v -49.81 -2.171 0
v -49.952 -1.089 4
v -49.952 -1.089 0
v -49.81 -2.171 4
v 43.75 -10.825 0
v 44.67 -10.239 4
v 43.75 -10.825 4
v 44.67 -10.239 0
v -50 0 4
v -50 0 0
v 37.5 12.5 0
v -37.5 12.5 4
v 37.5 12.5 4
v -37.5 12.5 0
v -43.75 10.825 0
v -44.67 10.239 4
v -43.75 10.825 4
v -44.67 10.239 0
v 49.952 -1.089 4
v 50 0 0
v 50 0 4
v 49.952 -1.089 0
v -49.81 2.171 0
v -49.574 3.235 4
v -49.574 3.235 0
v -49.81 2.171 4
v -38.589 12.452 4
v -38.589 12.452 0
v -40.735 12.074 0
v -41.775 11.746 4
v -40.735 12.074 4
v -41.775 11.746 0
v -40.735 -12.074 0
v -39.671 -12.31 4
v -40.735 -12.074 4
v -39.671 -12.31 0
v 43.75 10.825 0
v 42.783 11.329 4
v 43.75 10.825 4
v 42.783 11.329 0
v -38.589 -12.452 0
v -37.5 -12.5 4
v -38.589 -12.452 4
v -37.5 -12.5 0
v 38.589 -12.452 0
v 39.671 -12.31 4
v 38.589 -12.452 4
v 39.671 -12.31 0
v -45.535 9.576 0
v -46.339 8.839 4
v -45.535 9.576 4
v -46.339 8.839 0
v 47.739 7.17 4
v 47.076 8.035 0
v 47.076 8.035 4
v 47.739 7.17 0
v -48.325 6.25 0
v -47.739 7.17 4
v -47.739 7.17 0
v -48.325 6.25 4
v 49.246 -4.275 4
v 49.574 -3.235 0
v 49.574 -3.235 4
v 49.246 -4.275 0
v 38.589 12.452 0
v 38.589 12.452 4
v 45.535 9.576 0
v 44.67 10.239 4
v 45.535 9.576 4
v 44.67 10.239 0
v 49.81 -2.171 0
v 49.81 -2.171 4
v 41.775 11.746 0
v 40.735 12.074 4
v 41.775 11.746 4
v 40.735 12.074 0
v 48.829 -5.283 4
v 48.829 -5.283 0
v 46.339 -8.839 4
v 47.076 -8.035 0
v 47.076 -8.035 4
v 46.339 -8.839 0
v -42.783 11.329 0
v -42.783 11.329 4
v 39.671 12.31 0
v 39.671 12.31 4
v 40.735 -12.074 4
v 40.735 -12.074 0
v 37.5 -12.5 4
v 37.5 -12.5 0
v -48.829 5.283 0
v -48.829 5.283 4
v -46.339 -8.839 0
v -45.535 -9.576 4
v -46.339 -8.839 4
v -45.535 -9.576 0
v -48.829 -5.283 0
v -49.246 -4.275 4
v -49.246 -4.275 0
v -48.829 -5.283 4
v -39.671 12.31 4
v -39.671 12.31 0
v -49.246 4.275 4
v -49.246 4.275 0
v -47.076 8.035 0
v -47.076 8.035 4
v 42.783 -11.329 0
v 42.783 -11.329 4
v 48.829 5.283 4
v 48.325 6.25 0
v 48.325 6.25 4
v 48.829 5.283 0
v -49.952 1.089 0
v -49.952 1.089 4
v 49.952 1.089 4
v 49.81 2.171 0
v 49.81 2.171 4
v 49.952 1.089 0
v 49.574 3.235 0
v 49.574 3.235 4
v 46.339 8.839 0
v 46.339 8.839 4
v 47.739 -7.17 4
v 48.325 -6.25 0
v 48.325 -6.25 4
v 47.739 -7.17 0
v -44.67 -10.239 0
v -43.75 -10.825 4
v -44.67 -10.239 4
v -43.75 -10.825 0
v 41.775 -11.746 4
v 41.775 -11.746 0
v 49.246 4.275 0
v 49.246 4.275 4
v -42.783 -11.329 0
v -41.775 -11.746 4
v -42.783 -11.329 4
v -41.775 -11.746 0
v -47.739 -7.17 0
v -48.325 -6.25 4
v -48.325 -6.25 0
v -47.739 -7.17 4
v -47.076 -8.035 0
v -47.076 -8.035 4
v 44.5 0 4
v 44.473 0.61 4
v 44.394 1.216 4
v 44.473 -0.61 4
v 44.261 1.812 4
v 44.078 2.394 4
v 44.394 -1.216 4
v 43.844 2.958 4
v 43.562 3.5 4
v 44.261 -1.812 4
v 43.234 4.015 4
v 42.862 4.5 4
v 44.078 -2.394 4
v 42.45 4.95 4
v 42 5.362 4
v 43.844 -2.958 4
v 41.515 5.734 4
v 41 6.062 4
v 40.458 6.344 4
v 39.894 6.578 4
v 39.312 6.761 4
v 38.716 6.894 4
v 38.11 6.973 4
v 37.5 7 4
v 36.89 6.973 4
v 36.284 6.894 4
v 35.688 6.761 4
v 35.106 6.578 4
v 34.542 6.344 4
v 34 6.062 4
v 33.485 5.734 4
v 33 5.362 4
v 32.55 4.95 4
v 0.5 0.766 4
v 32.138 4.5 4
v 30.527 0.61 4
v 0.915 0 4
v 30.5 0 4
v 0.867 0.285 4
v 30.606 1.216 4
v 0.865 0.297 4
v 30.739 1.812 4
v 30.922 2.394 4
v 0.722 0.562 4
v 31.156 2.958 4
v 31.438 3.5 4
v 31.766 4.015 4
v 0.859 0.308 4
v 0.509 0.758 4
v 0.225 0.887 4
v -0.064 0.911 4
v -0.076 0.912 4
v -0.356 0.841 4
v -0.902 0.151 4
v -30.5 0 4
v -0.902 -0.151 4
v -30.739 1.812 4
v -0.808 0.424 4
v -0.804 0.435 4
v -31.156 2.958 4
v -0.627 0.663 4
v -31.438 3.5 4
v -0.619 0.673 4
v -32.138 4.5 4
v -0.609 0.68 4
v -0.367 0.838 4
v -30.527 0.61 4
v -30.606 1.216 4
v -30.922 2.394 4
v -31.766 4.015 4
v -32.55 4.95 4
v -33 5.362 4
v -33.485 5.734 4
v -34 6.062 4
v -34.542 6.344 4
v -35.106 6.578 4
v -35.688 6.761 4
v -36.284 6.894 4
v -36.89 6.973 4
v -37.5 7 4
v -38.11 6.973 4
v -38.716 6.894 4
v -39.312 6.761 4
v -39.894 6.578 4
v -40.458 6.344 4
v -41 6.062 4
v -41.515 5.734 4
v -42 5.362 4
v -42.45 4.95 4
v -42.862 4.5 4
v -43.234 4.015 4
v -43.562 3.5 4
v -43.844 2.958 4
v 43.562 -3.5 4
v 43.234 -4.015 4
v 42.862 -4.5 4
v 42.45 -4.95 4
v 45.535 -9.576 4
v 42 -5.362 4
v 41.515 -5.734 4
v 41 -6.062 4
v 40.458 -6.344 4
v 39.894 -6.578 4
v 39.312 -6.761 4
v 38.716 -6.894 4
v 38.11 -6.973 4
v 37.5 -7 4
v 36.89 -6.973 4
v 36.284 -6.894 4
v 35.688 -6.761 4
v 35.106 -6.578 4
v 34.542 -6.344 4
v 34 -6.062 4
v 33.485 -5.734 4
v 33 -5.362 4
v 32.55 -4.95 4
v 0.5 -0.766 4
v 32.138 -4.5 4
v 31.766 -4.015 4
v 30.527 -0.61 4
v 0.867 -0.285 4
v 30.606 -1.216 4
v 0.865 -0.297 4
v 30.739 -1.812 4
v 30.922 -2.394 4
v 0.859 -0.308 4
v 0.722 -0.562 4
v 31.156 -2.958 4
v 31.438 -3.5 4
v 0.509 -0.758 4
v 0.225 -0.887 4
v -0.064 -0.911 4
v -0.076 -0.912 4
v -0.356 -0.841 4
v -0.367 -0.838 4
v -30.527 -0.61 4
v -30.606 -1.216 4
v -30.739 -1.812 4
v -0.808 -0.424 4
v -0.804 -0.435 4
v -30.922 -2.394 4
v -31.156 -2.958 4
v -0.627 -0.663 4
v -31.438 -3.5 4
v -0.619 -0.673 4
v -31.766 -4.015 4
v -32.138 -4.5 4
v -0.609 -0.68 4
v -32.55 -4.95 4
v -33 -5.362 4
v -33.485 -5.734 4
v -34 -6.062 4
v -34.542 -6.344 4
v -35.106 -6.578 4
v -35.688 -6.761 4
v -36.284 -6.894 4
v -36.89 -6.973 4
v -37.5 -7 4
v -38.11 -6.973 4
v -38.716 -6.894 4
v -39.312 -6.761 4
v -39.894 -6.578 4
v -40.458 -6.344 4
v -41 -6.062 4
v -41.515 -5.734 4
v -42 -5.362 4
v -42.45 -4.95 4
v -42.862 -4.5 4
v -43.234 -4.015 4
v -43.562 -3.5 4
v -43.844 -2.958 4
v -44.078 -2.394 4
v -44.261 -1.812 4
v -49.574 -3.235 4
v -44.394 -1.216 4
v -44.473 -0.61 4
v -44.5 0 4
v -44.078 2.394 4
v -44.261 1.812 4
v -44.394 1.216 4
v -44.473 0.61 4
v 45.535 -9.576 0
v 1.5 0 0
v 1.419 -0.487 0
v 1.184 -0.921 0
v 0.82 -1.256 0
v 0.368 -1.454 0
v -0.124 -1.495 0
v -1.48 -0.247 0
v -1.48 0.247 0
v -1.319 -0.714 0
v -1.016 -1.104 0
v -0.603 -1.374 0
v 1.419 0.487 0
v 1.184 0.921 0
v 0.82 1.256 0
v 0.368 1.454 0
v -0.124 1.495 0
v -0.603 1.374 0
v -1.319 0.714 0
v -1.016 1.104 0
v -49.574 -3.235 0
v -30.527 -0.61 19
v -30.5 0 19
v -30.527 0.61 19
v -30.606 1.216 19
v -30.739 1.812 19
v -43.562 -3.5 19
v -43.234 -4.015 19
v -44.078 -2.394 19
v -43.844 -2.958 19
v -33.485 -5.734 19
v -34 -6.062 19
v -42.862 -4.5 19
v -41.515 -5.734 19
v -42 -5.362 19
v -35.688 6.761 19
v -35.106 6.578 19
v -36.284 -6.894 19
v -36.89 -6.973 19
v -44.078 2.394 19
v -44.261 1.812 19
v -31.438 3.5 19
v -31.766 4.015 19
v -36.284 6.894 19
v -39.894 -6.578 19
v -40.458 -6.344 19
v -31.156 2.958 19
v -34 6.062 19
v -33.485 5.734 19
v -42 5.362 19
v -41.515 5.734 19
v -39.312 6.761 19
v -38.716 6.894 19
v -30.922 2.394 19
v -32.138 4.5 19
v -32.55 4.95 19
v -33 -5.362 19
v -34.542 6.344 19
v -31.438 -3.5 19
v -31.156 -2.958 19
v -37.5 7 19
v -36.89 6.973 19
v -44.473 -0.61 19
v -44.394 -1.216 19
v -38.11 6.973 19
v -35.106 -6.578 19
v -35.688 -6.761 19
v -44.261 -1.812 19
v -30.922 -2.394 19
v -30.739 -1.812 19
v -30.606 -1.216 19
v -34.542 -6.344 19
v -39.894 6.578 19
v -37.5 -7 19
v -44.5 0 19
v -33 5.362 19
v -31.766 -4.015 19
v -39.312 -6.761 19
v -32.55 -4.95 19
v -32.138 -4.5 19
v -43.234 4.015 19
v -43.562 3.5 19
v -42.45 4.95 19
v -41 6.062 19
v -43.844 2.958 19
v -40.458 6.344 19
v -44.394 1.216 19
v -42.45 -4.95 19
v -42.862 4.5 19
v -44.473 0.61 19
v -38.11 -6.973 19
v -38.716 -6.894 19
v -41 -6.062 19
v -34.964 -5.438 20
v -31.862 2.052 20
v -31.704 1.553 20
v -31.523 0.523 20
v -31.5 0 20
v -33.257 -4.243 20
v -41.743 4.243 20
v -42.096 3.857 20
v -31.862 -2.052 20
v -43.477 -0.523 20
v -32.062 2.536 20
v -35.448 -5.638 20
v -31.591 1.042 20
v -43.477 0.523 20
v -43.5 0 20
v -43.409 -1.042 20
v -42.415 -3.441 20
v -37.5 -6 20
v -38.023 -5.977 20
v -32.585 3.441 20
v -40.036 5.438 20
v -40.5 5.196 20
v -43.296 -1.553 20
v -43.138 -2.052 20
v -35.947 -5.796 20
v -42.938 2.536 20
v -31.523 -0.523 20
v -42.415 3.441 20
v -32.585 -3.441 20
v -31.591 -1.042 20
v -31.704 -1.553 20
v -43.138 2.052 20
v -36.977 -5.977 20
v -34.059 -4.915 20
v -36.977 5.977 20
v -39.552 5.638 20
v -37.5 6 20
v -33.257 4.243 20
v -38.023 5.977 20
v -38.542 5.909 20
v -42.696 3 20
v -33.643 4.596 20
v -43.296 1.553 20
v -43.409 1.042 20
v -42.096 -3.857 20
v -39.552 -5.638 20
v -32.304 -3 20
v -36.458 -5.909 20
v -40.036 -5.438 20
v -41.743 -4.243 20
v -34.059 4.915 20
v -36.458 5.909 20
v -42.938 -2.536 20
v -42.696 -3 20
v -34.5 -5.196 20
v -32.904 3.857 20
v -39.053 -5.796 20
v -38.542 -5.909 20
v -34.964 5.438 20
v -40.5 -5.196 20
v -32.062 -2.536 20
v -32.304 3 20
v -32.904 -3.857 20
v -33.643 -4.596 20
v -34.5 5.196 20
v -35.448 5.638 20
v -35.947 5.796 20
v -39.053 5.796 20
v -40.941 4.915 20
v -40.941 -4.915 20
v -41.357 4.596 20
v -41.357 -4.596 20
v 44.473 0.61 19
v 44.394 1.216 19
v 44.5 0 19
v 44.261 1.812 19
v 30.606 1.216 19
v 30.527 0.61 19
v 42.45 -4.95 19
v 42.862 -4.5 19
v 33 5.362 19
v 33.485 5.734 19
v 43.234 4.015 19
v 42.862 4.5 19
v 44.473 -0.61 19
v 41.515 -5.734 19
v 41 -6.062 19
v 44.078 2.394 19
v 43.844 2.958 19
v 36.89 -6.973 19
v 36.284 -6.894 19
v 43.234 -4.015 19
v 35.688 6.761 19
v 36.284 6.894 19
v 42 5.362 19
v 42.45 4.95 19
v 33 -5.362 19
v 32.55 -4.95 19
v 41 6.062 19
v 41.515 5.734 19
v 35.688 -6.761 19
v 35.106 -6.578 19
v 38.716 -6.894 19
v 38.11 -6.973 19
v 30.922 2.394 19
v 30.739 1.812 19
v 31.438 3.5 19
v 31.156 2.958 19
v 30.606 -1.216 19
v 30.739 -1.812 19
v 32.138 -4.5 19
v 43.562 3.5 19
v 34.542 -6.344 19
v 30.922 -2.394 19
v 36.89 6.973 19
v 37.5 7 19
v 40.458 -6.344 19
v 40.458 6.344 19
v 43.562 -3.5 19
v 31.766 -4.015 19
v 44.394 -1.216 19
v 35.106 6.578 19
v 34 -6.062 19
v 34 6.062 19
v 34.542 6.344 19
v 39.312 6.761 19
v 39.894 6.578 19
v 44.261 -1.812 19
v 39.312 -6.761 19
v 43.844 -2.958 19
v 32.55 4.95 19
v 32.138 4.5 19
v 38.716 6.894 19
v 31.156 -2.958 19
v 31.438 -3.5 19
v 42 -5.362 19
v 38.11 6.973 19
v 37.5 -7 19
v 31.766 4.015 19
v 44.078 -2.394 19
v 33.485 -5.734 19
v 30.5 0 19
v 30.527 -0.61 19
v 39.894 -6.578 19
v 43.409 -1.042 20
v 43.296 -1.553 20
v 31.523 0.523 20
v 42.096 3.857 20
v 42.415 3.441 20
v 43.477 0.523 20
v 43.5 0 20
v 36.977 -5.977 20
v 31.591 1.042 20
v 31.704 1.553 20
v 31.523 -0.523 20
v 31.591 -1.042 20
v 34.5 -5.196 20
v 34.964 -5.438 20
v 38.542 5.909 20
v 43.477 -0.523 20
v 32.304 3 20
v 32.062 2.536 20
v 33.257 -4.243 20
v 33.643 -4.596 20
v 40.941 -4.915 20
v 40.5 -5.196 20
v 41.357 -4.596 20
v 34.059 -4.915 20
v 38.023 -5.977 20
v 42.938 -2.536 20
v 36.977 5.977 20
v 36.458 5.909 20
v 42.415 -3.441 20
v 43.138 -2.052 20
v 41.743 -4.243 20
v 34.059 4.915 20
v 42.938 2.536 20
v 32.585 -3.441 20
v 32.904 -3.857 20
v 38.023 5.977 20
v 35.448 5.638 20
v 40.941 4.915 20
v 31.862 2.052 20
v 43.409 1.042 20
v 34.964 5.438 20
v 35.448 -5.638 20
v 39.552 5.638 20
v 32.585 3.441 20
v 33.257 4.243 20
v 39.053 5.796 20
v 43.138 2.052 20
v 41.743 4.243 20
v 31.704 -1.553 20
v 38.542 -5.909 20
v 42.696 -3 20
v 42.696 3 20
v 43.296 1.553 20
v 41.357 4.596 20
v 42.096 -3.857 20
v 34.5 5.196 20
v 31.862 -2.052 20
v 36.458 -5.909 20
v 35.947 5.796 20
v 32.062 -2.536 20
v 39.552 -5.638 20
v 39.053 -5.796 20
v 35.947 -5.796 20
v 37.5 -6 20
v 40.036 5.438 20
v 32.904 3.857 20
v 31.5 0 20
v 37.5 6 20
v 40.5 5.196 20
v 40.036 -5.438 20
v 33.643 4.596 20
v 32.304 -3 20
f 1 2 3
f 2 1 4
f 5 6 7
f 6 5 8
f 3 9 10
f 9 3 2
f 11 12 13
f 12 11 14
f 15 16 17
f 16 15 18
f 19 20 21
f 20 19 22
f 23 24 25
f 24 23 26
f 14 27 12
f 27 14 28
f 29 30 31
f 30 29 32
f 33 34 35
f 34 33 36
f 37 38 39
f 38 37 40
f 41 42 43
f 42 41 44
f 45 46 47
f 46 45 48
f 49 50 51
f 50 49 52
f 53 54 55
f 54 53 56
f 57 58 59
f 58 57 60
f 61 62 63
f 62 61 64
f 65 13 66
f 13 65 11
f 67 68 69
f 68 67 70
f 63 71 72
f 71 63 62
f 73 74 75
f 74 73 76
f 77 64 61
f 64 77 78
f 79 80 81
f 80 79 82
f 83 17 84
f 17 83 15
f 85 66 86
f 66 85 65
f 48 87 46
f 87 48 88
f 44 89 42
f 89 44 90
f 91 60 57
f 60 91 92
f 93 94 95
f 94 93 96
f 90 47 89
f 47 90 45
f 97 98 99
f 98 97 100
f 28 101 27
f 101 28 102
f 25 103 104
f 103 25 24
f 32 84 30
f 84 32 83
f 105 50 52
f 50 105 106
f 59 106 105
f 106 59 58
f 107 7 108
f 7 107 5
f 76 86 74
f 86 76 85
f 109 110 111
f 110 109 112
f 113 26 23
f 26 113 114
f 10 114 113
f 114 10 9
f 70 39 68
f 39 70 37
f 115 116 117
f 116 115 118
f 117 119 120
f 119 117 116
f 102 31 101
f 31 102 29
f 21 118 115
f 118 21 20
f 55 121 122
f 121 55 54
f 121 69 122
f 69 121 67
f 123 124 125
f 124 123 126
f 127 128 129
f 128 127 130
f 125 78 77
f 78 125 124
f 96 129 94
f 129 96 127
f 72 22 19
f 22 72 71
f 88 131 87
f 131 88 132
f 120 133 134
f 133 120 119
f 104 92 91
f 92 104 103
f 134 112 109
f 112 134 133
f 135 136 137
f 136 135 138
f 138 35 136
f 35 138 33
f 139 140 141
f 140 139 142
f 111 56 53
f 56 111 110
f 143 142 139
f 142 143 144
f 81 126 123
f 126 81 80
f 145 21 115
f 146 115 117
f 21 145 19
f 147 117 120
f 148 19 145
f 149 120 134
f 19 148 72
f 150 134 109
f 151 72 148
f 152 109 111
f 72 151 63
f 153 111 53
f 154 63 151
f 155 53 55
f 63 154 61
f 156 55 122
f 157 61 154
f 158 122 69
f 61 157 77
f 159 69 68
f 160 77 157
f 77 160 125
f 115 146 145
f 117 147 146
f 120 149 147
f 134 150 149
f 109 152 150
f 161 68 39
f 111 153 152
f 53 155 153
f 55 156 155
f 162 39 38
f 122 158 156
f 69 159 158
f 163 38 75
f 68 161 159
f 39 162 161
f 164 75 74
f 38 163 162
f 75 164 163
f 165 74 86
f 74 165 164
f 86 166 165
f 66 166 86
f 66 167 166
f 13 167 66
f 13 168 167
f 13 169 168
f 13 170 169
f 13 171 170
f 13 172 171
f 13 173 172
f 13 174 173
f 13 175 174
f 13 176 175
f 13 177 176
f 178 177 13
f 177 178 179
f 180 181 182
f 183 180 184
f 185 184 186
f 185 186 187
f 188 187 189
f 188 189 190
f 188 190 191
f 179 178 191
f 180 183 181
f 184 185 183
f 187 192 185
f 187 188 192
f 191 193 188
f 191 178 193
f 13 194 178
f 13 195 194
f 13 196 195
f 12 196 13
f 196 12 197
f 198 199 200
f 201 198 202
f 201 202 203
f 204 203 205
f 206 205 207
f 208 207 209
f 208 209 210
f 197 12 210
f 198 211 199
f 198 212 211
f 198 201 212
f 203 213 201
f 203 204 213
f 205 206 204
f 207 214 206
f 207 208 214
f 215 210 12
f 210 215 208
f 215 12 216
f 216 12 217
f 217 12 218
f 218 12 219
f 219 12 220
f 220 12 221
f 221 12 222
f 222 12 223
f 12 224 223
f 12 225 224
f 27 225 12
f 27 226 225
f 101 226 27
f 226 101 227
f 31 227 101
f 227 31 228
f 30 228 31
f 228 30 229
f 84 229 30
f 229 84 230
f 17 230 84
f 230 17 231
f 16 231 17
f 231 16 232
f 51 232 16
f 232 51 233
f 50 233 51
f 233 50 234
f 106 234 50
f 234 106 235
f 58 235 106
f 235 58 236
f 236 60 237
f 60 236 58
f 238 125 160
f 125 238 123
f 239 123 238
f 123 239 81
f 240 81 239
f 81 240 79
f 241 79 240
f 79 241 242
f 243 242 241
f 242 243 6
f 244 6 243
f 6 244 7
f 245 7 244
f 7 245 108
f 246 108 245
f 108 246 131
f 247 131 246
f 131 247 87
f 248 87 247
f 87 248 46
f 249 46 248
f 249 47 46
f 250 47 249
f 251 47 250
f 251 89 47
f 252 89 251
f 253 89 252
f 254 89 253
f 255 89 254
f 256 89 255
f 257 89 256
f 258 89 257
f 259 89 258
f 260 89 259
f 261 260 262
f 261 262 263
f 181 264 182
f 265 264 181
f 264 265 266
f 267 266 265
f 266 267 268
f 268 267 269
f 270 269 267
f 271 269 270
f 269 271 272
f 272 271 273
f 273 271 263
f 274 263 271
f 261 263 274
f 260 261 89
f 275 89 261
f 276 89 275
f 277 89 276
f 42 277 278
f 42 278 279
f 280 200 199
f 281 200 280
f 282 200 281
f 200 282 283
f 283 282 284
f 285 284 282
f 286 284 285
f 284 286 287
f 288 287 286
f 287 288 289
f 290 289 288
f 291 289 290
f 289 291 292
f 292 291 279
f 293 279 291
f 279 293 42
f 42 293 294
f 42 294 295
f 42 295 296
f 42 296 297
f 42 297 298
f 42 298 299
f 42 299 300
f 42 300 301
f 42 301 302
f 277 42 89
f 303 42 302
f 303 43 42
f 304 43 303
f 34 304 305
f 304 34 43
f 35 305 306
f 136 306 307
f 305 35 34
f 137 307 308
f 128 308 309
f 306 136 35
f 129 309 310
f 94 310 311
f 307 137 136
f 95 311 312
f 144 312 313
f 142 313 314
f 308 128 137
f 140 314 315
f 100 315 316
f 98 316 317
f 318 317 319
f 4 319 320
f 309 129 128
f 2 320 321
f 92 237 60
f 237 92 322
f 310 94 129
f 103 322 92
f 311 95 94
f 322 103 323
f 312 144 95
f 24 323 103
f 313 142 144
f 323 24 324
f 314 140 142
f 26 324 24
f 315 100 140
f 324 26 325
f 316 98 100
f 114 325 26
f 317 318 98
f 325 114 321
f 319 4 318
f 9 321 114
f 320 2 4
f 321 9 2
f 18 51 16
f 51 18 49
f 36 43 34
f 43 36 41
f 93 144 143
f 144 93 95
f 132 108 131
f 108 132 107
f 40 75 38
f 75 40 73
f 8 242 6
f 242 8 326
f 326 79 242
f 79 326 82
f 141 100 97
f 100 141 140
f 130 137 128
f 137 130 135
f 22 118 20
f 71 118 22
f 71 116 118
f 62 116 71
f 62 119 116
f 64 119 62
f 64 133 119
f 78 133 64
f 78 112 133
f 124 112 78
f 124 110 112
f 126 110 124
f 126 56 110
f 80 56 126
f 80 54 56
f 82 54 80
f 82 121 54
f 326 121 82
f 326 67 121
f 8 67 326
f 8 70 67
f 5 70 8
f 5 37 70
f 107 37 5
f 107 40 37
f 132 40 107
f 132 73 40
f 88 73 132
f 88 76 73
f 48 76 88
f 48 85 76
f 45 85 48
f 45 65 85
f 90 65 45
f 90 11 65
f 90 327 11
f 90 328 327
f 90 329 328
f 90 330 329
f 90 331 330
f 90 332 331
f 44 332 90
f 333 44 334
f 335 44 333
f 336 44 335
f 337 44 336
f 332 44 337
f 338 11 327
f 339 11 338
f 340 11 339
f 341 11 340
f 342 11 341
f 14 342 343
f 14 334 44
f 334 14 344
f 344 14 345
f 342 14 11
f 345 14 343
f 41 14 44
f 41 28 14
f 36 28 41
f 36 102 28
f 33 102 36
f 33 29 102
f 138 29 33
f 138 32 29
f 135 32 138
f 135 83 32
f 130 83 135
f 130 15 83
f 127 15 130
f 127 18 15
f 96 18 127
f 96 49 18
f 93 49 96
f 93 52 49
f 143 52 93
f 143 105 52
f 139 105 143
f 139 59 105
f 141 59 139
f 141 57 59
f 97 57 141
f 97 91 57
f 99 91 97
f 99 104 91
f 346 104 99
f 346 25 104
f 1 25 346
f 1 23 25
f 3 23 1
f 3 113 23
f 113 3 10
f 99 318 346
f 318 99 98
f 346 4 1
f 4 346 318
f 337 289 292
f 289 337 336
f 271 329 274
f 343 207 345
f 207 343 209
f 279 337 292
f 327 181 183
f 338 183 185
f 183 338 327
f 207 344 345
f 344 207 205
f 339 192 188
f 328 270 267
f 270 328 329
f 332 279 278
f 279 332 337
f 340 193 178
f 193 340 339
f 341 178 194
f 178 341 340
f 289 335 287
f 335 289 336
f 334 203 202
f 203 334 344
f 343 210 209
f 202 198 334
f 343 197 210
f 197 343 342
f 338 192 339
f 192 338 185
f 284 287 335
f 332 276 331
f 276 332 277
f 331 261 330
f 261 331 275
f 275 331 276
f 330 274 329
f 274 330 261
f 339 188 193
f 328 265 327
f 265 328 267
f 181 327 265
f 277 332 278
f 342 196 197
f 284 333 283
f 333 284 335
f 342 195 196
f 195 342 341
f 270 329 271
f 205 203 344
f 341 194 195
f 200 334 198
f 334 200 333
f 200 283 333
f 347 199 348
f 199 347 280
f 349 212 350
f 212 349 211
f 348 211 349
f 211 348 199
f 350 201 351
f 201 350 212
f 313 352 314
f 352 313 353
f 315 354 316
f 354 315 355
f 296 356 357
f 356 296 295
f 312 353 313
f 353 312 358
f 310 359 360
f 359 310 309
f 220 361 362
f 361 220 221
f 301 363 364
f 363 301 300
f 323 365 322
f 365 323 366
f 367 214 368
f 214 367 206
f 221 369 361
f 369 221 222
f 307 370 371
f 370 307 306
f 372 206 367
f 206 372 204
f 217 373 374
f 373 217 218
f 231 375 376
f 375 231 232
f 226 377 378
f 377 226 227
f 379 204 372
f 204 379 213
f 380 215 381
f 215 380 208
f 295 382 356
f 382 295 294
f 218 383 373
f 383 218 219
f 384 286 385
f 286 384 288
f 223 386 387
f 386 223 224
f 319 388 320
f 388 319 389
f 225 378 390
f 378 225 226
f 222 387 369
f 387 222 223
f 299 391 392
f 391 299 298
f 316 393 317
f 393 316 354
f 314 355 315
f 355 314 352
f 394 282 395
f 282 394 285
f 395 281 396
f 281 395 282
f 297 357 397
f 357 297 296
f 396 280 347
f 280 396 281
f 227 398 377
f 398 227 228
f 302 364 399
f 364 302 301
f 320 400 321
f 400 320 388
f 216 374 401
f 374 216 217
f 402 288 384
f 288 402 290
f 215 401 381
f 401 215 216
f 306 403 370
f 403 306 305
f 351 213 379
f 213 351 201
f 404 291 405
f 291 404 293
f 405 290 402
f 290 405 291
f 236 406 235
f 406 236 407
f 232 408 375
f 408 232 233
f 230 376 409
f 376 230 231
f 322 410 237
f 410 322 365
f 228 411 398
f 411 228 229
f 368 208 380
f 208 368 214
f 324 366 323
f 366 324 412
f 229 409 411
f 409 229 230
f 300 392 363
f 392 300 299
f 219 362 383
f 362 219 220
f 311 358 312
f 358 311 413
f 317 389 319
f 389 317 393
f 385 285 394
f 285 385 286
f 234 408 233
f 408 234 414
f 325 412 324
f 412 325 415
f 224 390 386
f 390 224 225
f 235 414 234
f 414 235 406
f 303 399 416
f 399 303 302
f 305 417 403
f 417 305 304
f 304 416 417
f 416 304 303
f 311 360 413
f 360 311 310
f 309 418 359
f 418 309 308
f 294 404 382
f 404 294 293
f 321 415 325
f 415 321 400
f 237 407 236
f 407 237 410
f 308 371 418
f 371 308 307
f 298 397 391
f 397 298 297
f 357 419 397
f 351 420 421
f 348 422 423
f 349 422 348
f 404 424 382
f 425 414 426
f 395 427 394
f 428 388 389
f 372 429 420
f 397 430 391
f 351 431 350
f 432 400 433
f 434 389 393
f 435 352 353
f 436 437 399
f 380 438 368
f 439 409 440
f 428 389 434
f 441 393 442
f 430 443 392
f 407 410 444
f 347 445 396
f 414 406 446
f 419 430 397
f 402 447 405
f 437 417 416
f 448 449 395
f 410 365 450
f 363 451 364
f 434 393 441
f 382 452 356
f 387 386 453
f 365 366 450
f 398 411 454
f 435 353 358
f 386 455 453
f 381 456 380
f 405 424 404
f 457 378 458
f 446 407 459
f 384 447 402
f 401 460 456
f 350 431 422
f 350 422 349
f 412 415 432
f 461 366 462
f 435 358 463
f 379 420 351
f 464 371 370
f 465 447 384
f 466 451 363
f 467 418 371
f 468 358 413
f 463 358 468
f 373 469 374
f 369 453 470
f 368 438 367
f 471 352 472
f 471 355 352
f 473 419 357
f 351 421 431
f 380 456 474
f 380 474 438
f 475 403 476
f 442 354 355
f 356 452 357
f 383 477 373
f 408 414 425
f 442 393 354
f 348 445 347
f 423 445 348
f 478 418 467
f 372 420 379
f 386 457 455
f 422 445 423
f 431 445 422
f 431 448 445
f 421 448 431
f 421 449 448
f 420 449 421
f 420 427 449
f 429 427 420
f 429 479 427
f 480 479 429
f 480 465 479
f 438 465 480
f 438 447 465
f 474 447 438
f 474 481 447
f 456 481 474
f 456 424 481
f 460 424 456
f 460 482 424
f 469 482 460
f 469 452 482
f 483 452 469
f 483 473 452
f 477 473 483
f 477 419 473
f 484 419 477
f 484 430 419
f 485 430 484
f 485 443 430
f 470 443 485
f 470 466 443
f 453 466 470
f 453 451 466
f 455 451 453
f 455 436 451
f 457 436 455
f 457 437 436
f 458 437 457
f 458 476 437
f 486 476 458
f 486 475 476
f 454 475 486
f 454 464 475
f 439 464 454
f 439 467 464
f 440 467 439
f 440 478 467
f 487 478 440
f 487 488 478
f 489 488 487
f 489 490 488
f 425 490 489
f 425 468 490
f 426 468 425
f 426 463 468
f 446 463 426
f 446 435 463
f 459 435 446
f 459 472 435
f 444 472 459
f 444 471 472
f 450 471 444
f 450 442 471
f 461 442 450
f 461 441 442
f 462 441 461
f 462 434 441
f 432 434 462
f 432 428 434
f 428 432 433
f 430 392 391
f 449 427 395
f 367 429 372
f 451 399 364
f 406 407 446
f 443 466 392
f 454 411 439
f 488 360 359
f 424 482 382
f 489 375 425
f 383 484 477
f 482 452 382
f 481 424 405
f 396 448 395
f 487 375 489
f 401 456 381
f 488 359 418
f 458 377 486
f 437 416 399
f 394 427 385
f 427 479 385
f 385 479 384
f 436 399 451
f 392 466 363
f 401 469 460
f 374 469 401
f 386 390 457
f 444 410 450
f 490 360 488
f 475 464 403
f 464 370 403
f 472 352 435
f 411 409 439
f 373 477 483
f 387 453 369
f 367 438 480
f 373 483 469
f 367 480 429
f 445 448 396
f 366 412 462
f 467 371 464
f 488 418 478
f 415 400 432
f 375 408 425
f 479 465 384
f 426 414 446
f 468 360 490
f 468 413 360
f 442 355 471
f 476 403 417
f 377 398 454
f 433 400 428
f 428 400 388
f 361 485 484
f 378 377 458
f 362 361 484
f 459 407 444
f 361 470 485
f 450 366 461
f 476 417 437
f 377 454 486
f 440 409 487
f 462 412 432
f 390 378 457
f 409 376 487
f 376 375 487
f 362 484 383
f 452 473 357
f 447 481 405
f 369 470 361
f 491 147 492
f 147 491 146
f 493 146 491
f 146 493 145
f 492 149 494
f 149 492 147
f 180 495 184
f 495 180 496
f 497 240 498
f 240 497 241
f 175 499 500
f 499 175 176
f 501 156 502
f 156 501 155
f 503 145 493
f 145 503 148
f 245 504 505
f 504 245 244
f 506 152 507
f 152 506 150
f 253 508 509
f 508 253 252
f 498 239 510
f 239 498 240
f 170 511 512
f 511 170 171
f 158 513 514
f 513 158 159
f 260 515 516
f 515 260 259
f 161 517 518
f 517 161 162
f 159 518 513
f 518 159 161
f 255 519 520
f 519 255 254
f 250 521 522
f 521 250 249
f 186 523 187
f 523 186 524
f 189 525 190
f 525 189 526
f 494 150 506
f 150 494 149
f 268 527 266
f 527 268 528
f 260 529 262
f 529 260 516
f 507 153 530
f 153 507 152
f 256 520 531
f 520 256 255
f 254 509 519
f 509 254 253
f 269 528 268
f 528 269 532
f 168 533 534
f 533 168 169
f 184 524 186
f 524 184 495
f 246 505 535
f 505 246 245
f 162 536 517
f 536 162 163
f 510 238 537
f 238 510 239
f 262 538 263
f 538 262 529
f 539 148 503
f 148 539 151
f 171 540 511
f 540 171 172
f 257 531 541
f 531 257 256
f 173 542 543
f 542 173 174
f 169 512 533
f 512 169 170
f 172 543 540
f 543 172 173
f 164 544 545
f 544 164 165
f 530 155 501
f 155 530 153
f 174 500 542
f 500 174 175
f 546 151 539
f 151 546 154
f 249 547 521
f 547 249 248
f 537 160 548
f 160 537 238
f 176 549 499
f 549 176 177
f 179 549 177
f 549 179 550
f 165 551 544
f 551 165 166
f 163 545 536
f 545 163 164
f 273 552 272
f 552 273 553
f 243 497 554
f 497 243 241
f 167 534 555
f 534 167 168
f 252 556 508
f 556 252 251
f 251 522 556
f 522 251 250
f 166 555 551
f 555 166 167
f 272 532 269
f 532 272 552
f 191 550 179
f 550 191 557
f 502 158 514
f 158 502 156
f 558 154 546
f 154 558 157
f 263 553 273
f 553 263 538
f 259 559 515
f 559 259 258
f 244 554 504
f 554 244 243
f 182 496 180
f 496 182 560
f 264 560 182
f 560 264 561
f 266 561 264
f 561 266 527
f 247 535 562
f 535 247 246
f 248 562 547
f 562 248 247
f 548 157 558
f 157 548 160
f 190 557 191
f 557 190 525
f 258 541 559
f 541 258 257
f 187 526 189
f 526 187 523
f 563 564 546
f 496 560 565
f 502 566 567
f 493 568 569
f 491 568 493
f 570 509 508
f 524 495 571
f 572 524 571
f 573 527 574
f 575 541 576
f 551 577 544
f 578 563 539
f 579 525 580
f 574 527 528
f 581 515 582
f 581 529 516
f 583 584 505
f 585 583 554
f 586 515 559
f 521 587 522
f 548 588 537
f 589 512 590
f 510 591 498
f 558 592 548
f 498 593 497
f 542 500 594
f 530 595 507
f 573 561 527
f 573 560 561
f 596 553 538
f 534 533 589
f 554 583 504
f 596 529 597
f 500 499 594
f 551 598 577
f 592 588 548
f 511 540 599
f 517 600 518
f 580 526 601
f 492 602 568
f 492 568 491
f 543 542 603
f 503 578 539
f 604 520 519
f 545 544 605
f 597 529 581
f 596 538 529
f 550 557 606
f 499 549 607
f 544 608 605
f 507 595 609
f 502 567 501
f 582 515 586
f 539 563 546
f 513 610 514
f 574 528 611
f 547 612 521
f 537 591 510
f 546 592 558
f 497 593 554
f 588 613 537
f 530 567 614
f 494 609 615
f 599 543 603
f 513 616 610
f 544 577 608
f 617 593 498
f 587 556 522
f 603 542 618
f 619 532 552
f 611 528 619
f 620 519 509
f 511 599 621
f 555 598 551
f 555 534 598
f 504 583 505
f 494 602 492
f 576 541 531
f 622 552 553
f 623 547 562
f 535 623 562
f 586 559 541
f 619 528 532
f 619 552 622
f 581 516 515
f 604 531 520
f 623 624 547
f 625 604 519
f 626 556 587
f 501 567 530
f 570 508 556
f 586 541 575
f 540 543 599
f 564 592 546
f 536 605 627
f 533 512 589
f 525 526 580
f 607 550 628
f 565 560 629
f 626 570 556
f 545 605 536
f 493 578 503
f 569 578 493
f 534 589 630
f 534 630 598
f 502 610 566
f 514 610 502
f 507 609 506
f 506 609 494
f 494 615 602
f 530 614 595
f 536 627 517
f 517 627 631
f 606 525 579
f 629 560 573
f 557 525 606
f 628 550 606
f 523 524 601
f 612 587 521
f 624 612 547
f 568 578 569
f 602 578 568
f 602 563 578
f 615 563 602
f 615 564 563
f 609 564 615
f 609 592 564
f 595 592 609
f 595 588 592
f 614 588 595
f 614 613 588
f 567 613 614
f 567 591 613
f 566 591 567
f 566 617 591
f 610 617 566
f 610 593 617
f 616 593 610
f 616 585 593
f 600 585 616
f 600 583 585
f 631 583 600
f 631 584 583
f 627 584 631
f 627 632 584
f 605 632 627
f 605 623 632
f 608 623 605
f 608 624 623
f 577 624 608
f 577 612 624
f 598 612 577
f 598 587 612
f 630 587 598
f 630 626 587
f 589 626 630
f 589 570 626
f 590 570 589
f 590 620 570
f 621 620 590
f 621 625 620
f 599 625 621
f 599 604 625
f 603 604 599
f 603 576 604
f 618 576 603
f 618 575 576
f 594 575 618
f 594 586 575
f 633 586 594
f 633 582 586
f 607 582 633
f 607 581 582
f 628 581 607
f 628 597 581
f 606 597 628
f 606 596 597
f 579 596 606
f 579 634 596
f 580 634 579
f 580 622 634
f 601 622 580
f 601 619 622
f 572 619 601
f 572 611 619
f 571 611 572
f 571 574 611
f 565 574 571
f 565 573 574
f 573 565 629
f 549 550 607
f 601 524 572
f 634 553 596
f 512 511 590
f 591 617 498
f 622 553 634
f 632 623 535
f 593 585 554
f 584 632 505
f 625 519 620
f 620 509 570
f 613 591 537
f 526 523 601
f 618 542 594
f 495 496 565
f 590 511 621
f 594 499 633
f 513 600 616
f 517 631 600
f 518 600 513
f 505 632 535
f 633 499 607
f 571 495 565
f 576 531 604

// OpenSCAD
// https://makerworld.com/en/models/1104112-center-finder-customizable


/* [Dimensions] */
Diameter=25;
Lenght=100;
Height=4;   
/* [Roller Dimensions] */
Roller_Height=20;
Roller_Radius=7;
Roller_Chamfer=1;
/* [Center Hole Radius] */
// Pencil inlet radius
Inlet_Radius=1.5;
// Pencil outlet radius (between rollers)
Outlet_Radius=0.9;
/* [Hidden] */
$fs=.5;
/* [Hidden] */
$fa=5;


difference()  {
    linear_extrude(Height){
        hull(){
            translate([(Diameter-Lenght)/2,0])circle(d=Diameter);
            translate([(Lenght-Diameter)/2,0]) circle(d=Diameter);
        }
    }
    cylinder (h = Height+0.1, r2=Outlet_Radius, r1=Inlet_Radius);
}

translate([(Diameter-Lenght)/2,0,0])
    cylinder (h = Roller_Height-Roller_Chamfer, r=Roller_Radius);
translate([(Diameter-Lenght)/2,0, Roller_Height-Roller_Chamfer])
    cylinder(h = Roller_Chamfer, r1 = Roller_Radius, r2 = Roller_Radius - Roller_Chamfer);
translate([(Lenght-Diameter)/2,0,0])
    cylinder (h = Roller_Height-Roller_Chamfer, r=Roller_Radius);
translate([(Lenght-Diameter)/2,0, Roller_Height-Roller_Chamfer])
    cylinder(h = Roller_Chamfer, r1 = Roller_Radius, r2 = Roller_Radius - Roller_Chamfer);
